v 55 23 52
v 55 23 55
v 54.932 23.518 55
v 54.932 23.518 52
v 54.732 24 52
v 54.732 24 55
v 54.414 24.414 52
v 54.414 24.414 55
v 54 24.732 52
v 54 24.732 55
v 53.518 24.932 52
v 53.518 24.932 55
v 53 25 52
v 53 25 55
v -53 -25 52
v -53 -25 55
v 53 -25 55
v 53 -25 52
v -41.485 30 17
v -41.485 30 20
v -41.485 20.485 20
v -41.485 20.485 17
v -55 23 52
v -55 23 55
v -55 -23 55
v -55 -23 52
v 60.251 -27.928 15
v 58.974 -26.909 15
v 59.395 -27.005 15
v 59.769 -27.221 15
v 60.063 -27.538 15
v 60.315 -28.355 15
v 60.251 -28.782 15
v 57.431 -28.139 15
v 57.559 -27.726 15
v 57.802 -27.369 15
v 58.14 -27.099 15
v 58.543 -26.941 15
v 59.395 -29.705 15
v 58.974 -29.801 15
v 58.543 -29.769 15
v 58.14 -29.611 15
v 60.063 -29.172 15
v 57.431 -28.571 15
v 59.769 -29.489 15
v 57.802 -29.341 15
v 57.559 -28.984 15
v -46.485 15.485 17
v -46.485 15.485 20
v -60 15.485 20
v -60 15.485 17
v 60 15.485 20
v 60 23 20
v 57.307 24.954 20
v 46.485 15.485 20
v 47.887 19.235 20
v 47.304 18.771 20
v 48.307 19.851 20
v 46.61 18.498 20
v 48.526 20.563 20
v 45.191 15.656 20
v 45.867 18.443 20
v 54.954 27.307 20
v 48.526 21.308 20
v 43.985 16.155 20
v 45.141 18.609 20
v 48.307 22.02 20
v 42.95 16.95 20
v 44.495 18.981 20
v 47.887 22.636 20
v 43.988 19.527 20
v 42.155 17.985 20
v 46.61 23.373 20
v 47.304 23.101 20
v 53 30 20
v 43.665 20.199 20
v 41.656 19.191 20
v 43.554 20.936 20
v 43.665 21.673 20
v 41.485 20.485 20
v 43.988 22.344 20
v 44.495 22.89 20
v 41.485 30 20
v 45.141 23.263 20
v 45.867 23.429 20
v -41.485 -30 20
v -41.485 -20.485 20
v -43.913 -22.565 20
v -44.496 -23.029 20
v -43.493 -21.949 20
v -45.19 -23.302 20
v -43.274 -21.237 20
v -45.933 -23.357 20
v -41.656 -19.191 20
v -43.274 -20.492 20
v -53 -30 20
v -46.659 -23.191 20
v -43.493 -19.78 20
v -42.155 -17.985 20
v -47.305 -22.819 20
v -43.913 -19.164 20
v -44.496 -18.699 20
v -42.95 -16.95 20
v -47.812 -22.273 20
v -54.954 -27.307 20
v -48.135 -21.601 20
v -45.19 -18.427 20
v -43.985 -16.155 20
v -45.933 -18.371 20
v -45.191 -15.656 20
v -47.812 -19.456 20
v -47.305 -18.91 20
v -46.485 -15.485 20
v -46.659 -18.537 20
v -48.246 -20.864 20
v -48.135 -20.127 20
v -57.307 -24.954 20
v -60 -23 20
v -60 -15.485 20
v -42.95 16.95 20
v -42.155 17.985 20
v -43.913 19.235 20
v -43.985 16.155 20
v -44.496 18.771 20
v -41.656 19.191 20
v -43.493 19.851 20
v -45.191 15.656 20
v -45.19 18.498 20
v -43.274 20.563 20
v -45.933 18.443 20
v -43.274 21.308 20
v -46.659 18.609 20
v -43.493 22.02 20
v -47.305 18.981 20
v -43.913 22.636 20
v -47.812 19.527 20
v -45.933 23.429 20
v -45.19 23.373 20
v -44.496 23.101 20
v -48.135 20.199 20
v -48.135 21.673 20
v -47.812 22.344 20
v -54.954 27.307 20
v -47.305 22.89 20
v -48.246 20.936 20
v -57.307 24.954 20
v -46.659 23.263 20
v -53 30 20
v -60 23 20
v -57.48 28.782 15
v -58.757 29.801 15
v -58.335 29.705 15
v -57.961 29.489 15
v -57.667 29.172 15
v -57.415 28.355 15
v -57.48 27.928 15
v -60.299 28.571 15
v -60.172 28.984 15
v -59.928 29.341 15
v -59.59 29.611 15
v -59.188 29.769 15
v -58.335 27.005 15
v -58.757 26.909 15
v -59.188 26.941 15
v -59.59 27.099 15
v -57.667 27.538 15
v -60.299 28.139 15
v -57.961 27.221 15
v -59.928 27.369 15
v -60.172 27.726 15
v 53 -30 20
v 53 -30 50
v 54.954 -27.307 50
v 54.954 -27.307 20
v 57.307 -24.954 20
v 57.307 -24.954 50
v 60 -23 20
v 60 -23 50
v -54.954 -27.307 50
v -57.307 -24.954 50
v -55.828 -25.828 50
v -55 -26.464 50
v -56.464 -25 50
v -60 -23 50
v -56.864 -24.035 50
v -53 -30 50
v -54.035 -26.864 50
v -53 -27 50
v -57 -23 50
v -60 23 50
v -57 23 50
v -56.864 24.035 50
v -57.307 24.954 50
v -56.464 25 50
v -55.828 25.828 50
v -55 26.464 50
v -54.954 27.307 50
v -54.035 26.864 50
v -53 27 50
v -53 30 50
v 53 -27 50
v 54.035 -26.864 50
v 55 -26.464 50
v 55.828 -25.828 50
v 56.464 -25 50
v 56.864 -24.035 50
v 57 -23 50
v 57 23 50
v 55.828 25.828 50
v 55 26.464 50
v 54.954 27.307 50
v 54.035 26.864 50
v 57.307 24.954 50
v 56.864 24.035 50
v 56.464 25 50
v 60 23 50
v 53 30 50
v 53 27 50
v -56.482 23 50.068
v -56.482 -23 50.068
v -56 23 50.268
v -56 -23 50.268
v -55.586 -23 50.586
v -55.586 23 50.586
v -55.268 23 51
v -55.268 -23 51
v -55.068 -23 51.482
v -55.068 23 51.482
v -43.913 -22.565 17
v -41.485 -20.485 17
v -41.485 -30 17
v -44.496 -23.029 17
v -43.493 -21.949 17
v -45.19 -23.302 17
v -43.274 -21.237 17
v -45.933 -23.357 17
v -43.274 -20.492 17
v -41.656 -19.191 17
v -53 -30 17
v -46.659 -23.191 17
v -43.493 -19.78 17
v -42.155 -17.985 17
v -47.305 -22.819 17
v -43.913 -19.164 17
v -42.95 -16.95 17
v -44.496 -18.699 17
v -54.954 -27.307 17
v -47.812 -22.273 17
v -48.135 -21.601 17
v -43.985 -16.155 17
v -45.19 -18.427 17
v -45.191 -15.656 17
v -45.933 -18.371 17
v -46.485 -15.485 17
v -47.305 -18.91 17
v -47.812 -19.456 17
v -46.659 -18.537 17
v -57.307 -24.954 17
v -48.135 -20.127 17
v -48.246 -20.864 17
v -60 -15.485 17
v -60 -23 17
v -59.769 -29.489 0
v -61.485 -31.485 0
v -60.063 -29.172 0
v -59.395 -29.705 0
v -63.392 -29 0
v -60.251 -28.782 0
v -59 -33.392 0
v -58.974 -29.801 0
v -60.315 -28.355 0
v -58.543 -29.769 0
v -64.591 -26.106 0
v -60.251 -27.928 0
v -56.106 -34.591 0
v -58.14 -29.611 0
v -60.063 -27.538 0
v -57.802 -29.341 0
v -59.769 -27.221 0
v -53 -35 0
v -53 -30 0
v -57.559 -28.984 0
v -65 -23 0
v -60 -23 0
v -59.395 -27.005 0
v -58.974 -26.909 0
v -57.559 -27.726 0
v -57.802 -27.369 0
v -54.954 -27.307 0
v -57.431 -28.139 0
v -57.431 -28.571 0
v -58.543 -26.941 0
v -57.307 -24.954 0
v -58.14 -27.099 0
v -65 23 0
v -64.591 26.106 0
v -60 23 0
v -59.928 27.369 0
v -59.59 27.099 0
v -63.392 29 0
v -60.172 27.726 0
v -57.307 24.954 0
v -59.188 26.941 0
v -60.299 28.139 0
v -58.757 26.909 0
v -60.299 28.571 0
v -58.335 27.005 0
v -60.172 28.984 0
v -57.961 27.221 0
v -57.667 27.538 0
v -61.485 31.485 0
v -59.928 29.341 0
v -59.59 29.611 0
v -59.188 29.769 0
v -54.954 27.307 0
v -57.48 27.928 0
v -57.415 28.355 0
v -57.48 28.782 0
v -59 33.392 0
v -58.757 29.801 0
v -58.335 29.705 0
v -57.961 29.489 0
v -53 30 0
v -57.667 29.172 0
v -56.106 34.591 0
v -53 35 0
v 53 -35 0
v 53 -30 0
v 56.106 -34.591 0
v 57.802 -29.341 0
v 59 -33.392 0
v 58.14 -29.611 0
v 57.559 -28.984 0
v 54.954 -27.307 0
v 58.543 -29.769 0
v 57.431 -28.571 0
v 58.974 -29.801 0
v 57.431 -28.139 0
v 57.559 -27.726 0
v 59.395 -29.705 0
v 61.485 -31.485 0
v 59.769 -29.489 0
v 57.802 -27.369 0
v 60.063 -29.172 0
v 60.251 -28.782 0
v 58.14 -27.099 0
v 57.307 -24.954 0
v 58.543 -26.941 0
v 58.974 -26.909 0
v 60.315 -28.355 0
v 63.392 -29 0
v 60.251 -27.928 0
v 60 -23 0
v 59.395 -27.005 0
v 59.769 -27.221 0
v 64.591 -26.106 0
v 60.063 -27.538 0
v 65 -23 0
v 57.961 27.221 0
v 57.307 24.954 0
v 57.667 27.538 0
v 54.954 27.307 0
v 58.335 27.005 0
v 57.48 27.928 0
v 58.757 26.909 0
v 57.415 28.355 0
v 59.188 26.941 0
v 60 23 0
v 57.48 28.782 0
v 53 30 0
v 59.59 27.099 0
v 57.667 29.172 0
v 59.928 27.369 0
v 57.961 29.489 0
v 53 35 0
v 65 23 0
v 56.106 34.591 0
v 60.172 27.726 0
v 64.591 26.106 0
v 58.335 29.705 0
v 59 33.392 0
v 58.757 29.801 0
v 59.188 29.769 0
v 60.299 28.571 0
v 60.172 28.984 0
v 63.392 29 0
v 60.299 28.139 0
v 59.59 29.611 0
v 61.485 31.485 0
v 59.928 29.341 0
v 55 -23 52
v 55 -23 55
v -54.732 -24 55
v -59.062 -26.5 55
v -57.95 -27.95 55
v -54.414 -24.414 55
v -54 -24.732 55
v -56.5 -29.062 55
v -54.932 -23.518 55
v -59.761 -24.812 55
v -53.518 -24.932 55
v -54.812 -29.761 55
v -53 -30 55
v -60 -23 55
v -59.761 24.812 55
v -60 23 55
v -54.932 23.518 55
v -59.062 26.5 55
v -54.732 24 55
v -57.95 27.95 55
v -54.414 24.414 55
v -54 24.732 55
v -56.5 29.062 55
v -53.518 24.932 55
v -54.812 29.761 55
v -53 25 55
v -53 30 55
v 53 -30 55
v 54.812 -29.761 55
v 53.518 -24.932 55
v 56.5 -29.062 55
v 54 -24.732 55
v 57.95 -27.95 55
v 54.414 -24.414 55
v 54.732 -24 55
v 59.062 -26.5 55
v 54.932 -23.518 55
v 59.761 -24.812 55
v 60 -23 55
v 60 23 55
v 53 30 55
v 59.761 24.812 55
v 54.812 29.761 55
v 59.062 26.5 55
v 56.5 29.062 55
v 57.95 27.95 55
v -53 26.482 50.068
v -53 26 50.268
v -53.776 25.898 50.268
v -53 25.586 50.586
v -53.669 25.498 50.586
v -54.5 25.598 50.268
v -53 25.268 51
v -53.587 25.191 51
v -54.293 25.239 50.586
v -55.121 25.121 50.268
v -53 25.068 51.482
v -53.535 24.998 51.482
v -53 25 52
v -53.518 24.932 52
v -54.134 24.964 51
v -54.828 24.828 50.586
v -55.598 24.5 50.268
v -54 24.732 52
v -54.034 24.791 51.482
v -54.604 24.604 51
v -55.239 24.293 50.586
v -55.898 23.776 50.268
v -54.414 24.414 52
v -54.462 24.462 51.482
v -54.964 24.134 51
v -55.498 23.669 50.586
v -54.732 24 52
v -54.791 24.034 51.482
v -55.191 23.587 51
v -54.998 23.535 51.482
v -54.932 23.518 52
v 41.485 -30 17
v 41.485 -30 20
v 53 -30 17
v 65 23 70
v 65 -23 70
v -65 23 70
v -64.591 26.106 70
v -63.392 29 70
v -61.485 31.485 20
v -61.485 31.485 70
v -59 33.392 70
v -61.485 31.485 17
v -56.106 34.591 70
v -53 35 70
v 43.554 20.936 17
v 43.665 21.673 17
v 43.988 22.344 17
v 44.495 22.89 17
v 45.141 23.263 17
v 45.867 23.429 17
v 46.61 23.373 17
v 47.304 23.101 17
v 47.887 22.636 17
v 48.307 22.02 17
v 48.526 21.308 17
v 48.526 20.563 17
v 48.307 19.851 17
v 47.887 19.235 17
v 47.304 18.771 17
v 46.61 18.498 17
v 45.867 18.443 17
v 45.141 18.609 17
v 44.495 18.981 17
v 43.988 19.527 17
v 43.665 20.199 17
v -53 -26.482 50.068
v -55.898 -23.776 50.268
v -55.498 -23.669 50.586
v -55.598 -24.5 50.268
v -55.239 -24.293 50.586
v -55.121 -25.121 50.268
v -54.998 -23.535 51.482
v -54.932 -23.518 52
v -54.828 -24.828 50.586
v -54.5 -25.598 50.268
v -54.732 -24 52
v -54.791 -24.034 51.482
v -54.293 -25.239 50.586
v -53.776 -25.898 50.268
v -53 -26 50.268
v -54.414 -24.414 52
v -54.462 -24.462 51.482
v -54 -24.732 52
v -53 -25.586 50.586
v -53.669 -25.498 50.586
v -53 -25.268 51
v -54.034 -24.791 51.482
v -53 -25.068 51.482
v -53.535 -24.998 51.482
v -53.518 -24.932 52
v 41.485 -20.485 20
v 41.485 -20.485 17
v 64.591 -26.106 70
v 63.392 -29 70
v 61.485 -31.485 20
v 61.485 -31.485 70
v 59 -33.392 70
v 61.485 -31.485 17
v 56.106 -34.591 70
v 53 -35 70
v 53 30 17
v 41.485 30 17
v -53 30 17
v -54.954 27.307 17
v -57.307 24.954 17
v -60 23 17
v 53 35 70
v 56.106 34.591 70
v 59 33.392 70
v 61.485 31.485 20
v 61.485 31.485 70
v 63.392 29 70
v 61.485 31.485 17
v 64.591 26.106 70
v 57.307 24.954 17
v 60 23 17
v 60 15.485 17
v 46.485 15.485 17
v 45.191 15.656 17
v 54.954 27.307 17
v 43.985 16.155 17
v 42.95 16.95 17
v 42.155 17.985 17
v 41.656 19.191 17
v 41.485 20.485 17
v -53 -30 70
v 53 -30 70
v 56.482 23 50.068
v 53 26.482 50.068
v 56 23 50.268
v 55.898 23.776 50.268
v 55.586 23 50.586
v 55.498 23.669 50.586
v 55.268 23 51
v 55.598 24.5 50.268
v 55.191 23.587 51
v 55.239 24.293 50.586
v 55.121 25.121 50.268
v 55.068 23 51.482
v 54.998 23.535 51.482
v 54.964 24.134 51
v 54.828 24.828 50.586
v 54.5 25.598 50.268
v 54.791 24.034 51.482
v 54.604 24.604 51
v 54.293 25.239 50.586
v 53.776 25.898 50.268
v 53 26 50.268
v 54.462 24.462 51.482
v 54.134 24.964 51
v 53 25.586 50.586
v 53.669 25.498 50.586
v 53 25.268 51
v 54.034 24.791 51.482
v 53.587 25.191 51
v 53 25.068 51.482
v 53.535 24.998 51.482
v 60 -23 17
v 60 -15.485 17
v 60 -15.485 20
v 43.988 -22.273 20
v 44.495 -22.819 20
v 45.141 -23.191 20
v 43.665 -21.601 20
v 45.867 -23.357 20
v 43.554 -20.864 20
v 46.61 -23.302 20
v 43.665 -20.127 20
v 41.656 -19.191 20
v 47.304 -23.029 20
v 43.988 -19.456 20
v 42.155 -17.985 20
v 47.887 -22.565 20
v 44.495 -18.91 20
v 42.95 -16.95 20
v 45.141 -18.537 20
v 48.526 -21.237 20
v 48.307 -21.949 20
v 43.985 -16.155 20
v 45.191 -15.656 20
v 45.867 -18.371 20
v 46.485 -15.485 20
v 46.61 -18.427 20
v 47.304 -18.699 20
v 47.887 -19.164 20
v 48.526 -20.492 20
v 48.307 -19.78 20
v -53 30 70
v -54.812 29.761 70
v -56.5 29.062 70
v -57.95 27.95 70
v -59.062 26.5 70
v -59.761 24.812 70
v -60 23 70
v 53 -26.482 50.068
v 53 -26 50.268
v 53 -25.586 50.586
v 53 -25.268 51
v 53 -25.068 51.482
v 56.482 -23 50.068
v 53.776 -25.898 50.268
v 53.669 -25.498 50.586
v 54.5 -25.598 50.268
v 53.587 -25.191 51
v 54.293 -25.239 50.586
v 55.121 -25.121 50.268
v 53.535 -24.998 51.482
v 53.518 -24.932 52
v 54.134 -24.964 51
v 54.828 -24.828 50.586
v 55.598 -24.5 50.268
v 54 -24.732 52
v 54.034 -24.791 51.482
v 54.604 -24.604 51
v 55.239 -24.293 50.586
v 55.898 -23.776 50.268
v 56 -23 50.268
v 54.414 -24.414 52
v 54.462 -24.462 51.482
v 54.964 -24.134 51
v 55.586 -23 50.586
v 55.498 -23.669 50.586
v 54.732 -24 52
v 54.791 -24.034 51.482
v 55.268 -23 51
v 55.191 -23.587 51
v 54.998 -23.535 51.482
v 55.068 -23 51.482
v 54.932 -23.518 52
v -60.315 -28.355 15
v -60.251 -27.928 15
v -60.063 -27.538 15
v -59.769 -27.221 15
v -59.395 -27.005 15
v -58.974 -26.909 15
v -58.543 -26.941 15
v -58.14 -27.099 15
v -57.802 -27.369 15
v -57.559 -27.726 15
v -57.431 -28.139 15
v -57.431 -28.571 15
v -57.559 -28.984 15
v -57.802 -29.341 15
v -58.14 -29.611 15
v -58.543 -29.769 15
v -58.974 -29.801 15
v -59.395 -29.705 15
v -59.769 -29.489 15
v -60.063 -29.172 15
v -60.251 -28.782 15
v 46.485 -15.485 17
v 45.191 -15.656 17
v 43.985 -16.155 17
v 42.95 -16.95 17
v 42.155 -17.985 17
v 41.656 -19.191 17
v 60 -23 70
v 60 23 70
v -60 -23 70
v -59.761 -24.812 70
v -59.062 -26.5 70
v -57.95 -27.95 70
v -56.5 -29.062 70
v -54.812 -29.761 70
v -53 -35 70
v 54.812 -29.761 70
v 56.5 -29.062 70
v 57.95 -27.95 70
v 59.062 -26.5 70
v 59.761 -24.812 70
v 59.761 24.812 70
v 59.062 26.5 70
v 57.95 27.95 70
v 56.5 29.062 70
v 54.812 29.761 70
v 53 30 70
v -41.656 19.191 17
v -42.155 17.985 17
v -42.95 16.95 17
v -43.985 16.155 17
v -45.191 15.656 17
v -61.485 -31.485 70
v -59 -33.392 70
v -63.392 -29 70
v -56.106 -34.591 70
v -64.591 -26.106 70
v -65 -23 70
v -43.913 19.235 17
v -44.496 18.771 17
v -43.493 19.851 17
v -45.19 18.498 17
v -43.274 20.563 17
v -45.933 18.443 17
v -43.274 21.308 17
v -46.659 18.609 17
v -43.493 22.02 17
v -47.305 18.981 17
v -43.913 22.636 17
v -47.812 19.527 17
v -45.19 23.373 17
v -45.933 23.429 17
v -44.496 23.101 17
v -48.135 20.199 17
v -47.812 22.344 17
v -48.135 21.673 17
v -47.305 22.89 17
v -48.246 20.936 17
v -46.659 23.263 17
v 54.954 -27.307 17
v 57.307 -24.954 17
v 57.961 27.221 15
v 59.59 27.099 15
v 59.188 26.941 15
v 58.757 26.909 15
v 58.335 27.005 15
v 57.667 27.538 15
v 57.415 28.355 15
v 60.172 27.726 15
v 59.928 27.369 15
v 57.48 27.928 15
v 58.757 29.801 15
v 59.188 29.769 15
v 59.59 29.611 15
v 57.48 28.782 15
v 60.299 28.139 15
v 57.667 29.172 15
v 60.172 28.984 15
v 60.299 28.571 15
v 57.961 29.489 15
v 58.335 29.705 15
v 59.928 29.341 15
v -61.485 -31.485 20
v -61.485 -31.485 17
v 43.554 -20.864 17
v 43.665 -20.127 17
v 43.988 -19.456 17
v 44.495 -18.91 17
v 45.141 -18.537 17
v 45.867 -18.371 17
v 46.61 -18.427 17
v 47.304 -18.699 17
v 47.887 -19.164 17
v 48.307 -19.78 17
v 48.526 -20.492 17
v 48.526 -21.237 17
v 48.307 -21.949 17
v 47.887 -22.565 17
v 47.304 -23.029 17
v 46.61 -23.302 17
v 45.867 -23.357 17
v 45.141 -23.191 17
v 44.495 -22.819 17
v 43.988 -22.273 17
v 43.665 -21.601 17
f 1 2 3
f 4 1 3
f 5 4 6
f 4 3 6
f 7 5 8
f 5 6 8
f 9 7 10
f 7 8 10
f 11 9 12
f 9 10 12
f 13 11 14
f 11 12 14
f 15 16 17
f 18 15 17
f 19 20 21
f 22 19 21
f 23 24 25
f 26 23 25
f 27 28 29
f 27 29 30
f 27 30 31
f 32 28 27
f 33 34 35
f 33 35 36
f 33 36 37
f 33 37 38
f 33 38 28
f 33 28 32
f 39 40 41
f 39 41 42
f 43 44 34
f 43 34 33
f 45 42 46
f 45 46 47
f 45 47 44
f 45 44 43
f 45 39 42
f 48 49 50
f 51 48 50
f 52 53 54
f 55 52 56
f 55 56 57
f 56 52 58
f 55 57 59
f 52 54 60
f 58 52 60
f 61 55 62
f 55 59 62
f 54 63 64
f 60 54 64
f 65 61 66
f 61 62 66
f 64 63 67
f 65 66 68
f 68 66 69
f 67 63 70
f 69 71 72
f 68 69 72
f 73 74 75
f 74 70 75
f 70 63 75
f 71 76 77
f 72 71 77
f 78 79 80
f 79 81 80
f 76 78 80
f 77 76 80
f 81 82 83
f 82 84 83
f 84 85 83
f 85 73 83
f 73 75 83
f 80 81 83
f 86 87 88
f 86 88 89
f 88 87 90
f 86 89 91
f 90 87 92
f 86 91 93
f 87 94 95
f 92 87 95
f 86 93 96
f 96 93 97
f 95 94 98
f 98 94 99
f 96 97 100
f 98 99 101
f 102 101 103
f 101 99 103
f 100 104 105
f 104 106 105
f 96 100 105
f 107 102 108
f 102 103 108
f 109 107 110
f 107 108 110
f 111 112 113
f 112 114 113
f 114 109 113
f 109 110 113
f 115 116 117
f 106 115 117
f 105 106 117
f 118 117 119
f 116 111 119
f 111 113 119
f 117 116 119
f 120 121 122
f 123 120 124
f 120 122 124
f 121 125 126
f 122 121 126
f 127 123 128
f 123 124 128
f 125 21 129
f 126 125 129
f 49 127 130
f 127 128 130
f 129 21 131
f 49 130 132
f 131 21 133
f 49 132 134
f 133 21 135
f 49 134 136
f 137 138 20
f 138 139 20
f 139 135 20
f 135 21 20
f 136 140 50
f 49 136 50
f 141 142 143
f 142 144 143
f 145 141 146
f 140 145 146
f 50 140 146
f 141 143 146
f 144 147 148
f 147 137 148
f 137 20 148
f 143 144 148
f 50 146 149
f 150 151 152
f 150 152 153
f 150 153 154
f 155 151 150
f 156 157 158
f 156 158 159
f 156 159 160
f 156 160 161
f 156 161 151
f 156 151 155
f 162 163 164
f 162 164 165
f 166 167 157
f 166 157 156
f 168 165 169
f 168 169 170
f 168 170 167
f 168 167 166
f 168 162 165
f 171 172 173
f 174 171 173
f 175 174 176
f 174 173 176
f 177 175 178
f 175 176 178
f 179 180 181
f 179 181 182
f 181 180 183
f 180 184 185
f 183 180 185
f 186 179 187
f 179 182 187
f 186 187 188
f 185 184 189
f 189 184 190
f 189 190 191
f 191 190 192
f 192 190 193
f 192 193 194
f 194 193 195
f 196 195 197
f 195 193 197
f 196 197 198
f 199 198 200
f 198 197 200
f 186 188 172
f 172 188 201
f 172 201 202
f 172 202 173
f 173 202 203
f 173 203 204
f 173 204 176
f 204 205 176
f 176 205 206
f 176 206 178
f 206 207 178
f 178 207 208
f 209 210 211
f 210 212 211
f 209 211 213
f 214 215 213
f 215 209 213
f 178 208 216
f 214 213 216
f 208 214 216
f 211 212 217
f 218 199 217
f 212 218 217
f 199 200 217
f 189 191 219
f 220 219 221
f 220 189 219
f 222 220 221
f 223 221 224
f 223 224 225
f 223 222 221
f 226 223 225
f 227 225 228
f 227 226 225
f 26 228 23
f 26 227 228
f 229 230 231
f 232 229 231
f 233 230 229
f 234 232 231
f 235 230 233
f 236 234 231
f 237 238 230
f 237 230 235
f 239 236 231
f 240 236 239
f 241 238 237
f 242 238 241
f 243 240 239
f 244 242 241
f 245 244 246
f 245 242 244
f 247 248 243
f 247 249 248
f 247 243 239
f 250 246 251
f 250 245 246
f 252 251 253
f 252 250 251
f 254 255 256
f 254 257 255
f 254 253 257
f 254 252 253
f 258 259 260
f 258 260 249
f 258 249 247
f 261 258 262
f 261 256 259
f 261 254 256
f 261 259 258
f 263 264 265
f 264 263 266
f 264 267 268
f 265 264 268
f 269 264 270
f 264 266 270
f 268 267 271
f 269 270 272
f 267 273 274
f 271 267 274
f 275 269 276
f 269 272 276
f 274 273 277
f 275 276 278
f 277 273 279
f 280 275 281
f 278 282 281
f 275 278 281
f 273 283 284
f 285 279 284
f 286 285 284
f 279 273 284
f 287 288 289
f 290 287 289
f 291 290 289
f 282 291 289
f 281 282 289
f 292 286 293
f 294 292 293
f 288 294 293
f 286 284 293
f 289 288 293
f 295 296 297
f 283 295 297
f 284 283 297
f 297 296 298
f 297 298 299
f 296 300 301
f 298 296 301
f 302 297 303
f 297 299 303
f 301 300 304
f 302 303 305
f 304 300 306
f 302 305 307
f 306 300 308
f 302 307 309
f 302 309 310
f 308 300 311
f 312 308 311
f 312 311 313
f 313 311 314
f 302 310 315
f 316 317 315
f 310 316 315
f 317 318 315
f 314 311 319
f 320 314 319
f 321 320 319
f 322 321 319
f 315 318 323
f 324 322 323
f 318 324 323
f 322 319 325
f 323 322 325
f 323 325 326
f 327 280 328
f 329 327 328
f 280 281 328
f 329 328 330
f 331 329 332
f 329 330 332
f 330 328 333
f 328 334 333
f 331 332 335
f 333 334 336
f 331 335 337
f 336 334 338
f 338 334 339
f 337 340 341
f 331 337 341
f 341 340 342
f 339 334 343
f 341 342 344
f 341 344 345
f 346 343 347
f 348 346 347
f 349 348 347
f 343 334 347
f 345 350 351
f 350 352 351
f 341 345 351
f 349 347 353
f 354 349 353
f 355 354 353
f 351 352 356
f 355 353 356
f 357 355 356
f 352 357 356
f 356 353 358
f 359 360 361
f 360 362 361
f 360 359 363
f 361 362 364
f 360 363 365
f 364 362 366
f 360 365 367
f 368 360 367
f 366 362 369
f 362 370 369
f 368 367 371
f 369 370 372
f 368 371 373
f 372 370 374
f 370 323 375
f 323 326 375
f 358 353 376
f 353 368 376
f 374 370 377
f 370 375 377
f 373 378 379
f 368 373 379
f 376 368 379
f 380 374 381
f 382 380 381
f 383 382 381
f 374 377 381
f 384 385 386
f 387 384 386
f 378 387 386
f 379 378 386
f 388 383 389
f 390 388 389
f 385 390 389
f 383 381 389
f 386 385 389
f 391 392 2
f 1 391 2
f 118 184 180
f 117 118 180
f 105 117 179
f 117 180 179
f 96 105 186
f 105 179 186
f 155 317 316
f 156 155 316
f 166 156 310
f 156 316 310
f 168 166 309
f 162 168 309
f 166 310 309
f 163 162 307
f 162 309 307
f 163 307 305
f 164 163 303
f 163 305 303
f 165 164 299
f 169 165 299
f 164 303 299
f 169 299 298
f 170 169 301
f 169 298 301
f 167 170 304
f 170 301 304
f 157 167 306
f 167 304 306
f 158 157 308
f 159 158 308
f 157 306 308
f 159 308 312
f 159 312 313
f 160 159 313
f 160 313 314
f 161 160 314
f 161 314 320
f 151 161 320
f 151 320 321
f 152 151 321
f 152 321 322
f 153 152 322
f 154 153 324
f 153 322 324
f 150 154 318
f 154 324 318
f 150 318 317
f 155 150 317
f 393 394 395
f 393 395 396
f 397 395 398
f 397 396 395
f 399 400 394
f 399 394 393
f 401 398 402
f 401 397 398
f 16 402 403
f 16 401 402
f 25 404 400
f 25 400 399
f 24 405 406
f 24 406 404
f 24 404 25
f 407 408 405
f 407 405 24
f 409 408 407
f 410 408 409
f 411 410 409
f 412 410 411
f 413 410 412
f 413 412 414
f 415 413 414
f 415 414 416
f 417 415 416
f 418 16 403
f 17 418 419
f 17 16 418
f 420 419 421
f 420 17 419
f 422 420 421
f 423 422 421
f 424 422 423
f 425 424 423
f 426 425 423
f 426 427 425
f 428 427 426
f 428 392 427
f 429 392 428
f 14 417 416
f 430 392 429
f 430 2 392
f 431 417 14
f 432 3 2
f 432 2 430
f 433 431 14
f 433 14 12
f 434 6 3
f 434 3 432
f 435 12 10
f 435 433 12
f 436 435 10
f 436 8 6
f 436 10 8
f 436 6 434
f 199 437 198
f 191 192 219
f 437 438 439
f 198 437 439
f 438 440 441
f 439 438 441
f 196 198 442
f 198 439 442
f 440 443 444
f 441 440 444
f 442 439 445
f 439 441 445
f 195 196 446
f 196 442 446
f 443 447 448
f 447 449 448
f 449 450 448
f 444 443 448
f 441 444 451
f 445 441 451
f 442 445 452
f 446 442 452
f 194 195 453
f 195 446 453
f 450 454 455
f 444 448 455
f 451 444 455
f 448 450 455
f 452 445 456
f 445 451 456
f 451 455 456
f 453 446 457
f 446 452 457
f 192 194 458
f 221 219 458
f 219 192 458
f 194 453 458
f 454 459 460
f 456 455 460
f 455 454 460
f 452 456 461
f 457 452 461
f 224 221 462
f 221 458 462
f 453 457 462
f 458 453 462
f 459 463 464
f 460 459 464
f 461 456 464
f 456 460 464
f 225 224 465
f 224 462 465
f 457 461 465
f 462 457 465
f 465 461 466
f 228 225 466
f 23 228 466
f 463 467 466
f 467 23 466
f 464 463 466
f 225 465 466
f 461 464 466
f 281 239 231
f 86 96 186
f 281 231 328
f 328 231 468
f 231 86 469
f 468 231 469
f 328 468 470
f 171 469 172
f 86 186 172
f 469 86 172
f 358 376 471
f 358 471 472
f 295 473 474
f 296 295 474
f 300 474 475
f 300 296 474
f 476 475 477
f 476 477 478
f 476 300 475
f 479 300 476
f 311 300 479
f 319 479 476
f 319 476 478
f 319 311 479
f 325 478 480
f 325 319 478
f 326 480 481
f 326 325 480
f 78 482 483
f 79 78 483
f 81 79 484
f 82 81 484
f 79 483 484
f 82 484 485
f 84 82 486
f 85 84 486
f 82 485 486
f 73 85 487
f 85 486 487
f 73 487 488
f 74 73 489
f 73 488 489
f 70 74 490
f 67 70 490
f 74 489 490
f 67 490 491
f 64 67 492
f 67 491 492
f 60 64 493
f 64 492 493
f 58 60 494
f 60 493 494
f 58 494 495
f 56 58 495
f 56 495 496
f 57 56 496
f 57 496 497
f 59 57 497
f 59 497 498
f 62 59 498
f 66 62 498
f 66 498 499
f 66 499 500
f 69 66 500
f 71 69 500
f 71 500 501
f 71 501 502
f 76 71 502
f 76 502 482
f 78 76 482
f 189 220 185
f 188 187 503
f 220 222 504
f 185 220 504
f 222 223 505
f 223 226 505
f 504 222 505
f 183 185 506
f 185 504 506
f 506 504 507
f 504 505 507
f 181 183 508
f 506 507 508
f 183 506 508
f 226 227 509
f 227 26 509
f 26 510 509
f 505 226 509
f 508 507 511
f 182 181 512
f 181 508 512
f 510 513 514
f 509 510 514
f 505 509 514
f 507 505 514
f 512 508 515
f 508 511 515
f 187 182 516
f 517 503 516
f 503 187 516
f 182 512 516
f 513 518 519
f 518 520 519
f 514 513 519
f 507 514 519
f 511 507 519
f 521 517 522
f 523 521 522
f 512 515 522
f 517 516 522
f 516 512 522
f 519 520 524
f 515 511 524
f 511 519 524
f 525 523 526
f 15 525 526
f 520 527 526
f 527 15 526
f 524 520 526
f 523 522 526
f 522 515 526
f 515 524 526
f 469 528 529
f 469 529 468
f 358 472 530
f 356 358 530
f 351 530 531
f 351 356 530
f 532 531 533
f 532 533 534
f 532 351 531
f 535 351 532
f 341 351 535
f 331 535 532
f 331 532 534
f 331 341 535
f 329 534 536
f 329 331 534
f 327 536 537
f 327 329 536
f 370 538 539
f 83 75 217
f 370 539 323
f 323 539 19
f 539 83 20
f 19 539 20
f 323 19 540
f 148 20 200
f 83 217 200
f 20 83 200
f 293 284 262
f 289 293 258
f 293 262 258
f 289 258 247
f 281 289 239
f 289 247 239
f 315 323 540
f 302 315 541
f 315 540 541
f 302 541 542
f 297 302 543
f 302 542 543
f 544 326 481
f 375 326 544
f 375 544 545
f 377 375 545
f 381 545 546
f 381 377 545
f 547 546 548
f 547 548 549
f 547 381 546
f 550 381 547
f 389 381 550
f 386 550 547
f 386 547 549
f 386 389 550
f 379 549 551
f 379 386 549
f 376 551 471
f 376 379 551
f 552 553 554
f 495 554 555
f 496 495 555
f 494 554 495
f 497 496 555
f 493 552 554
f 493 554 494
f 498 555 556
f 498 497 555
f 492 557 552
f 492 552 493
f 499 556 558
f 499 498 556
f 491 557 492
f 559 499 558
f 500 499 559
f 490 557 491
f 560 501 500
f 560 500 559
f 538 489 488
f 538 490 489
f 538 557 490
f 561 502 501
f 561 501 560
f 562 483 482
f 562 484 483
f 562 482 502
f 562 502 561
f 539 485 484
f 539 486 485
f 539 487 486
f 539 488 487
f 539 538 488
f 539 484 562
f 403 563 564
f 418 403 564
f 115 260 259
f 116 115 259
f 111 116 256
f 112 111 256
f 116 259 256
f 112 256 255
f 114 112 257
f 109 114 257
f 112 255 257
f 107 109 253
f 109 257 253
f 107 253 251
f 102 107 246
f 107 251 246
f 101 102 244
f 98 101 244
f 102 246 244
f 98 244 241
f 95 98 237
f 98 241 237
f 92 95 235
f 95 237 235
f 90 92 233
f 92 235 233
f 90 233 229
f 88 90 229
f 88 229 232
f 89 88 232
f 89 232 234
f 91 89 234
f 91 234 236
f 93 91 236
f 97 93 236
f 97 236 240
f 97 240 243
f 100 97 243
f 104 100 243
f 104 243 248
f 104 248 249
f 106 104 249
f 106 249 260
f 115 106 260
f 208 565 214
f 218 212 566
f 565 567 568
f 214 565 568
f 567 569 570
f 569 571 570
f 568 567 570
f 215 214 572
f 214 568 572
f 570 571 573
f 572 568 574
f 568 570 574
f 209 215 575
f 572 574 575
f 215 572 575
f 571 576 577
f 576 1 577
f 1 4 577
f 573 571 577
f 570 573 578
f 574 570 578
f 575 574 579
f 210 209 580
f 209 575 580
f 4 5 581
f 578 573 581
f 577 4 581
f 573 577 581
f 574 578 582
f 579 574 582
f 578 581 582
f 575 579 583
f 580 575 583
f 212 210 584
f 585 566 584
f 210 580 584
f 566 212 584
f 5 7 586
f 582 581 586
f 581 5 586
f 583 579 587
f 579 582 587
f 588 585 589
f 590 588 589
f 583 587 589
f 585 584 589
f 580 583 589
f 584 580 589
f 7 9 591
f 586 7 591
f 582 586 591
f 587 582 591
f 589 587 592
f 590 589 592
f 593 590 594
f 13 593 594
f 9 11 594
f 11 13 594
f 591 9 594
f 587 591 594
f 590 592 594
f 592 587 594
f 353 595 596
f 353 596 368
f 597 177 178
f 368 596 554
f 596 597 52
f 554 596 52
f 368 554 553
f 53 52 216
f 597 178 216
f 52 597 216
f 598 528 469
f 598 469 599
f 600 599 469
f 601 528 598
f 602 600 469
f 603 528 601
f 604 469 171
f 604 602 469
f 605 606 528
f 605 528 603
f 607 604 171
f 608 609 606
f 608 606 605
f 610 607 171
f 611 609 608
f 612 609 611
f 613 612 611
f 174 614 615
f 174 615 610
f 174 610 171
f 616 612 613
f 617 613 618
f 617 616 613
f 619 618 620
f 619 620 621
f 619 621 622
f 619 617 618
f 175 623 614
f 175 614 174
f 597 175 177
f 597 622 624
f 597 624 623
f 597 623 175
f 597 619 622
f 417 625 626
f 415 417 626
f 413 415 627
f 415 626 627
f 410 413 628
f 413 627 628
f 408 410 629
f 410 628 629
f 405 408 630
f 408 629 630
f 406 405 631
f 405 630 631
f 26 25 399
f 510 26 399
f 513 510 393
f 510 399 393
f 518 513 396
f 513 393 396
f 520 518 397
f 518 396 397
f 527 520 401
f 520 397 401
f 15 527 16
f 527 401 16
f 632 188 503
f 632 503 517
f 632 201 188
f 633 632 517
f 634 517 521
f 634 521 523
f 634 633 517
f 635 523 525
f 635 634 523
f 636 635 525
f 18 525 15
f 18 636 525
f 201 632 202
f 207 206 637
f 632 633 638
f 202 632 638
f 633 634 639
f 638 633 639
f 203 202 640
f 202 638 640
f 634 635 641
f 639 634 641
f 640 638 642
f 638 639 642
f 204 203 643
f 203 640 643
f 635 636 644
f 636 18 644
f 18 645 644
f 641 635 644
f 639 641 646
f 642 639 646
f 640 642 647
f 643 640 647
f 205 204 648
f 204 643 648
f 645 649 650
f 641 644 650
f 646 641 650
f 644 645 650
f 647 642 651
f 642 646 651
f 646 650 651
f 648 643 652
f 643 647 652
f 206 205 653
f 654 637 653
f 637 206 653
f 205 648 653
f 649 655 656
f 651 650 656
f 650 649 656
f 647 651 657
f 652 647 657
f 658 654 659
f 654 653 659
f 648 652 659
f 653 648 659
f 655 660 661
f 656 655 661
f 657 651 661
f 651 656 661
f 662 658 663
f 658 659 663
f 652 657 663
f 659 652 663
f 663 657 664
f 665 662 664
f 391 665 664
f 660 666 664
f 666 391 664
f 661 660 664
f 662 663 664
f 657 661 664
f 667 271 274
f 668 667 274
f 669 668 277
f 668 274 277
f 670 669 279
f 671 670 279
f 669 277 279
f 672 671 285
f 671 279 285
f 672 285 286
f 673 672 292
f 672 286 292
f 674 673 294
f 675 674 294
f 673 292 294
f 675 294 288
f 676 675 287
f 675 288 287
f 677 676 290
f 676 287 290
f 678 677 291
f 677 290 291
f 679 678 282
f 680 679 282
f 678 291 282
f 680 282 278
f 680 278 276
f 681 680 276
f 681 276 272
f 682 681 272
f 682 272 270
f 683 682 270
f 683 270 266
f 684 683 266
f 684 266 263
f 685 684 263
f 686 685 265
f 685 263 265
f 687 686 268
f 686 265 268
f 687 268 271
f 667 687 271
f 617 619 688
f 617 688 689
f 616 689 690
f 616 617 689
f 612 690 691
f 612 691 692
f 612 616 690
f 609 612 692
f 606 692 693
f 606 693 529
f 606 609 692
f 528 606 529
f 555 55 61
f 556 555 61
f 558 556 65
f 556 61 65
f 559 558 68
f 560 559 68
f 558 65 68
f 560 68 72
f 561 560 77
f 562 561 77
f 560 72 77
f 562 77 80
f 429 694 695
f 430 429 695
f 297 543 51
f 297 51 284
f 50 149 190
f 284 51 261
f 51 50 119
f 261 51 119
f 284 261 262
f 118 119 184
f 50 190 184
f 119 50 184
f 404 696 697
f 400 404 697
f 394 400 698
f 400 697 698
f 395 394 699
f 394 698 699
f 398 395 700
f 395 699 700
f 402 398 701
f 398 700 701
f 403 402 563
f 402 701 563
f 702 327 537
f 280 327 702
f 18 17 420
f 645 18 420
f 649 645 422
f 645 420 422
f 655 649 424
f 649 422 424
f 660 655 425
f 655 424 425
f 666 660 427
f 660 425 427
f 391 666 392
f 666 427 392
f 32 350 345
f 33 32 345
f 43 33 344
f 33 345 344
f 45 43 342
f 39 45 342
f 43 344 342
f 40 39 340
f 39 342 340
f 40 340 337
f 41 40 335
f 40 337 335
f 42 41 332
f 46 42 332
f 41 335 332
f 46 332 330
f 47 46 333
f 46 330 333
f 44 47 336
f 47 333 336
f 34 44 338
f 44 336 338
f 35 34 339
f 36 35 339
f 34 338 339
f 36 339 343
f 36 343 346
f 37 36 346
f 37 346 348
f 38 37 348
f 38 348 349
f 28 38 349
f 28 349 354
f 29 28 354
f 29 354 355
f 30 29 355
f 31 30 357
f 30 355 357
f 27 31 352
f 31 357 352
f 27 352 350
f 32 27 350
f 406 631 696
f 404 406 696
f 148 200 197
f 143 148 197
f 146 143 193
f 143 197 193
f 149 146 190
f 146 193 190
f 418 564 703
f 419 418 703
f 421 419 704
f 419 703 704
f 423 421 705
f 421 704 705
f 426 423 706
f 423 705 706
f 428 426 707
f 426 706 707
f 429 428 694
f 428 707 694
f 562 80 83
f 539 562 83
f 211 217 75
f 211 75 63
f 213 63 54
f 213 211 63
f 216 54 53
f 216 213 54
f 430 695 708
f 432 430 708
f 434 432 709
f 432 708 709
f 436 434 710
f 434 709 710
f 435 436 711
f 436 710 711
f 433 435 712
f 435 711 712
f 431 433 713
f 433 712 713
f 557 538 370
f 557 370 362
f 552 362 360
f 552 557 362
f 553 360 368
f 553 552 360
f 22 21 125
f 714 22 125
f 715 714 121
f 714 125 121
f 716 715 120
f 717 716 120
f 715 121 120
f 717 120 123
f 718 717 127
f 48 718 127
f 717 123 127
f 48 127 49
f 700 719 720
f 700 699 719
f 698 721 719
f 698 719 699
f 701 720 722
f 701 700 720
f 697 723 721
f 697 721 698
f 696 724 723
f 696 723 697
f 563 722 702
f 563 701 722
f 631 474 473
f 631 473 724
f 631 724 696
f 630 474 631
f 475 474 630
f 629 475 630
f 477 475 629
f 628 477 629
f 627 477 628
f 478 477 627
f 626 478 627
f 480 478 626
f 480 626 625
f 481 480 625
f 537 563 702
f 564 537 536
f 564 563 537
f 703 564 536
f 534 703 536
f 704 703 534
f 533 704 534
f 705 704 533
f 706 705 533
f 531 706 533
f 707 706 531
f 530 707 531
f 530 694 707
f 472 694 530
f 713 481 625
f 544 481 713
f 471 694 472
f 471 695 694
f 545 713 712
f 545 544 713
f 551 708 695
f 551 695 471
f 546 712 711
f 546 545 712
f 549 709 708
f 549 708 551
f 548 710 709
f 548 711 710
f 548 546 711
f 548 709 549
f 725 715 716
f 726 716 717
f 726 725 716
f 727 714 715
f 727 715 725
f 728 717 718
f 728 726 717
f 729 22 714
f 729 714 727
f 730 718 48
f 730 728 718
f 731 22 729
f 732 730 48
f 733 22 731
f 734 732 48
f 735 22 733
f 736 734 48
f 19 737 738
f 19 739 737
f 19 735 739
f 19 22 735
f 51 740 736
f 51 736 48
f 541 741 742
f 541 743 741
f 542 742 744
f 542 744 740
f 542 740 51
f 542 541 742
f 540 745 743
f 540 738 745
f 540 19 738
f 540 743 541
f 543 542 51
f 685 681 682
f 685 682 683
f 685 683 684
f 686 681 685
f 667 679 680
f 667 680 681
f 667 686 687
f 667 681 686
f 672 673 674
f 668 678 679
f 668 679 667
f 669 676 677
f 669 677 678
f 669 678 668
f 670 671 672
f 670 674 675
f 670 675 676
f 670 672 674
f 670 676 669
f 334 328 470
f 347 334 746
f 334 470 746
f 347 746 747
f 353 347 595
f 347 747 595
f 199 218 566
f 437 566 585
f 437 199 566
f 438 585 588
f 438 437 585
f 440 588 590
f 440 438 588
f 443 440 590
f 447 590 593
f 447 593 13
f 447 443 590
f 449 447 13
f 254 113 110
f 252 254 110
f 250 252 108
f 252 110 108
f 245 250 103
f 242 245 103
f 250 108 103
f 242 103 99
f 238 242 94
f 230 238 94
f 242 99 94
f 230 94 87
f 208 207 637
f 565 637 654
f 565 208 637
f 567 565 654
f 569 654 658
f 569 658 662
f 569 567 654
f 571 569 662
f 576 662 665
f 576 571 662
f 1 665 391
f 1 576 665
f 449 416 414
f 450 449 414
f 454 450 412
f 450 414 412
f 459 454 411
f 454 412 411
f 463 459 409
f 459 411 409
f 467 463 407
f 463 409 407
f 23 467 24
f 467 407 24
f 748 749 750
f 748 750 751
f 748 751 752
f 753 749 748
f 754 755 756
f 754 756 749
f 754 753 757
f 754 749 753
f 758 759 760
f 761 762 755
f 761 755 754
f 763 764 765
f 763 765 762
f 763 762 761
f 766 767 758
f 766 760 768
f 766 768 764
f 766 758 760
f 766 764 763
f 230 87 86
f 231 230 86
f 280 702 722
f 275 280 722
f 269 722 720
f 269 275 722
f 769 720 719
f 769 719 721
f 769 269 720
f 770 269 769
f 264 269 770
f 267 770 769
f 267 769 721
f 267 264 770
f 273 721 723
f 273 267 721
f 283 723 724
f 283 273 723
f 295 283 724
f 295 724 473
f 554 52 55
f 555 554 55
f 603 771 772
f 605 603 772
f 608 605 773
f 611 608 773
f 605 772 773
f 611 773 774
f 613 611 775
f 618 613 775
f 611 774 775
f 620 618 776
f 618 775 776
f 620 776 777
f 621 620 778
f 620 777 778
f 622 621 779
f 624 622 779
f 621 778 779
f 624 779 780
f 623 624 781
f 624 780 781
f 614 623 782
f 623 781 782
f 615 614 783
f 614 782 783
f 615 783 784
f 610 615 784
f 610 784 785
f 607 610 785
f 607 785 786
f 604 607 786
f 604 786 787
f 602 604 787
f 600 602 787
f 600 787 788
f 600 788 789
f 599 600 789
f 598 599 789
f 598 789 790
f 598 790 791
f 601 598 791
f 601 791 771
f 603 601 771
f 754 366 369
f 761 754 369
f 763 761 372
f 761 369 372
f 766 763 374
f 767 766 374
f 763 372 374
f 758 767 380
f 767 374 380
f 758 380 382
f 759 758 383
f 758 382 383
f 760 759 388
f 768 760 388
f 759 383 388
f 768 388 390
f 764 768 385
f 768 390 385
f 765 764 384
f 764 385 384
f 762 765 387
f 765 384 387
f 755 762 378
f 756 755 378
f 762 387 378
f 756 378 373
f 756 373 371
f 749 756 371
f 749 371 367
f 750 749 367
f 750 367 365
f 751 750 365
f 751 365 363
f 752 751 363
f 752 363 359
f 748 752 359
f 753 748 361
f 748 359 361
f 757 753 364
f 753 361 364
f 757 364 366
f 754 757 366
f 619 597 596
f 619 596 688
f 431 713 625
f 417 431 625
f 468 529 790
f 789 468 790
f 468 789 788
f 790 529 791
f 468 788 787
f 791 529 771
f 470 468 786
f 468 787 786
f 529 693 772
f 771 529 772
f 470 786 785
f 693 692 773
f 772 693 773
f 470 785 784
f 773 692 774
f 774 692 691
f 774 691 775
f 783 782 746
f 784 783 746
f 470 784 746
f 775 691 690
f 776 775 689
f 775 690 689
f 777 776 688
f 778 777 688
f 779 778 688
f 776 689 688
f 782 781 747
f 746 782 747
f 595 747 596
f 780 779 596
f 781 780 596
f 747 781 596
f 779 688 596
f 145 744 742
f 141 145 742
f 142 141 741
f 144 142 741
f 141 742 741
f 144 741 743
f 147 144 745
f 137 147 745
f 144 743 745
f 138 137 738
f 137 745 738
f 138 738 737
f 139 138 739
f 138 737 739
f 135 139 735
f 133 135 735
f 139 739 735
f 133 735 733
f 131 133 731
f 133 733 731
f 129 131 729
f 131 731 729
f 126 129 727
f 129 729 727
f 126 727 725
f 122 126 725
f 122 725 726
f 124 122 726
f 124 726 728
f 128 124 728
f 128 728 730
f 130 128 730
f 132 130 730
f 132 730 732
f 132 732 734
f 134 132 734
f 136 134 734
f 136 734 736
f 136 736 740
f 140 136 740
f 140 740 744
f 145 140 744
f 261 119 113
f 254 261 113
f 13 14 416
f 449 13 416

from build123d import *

# Parameters (mm, degrees)
EXTRUDE_1_DEPTH     = 70
CUT_EXTRUDE_1_DEPTH = 70
EXTRUDE_2_DEPTH     = 20
CUT_EXTRUDE_2_DEPTH = 15
EXTRUDE_3_DEPTH     = 50
SKETCH_5_R          = 1.45
CUT_EXTRUDE_3_DEPTH = 15
FILLET_1_R          = 2
EXTRUDE_4_DEPTH     = 3
SKETCH_7_R          = 2.5
CUT_EXTRUDE_4_DEPTH = 4


with BuildPart() as part:
    # Эскиз1 → Бобышка-Вытянуть1 (new body)
    with BuildSketch(Plane.XY):
        with BuildLine():
            Line((-53, 35), (53, 35))
            ThreePointArc((53, 35), (61.485281374, 31.485281374), (65, 23))
            Line((65, 23), (65, -23))
            ThreePointArc((65, -23), (61.485281374, -31.485281374), (53, -35))
            Line((53, -35), (-53, -35))
            ThreePointArc((-53, -35), (-61.485281374, -31.485281374), (-65, -23))
            Line((-65, -23), (-65, 23))
            ThreePointArc((-65, 23), (-61.485281374, 31.485281374), (-53, 35))
        make_face()
    extrude(amount=EXTRUDE_1_DEPTH)

    # Эскиз2 → Вырез-Вытянуть1 (cut)
    with BuildSketch(Plane.XY.offset(70)):
        with BuildLine():
            Line((-53, -30), (53, -30))
            ThreePointArc((53, -30), (57.949747468, -27.949747468), (60, -23))
            Line((60, -23), (60, 23))
            ThreePointArc((60, 23), (57.949747468, 27.949747468), (53, 30))
            Line((53, 30), (-53, 30))
            ThreePointArc((-53, 30), (-57.949747468, 27.949747468), (-60, 23))
            Line((-60, 23), (-60, -23))
            ThreePointArc((-60, -23), (-57.949747468, -27.949747468), (-53, -30))
        make_face()
    extrude(amount=-CUT_EXTRUDE_1_DEPTH, mode=Mode.SUBTRACT)

    # Эскиз3 → Бобышка-Вытянуть2 (add)
    with BuildSketch(Plane.XY.offset(70)):
        with BuildLine():
            Line((-53, -30), (53, -30))
            ThreePointArc((53, -30), (57.949747468, -27.949747468), (60, -23))
            Line((60, -23), (60, 23))
            ThreePointArc((60, 23), (57.949747468, 27.949747468), (53, 30))
            Line((53, 30), (-53, 30))
            ThreePointArc((-53, 30), (-57.949747468, 27.949747468), (-60, 23))
            Line((-60, 23), (-60, -23))
            ThreePointArc((-60, -23), (-57.949747468, -27.949747468), (-53, -30))
        make_face()
        with BuildLine():
            Line((-53, -25), (53, -25))
            ThreePointArc((53, -25), (54.414213562, -24.414213562), (55, -23))
            Line((55, -23), (55, 23))
            ThreePointArc((55, 23), (54.414213562, 24.414213562), (53, 25))
            Line((53, 25), (-53, 25))
            ThreePointArc((-53, 25), (-54.414213562, 24.414213562), (-55, 23))
            Line((-55, 23), (-55, -23))
            ThreePointArc((-55, -23), (-54.414213562, -24.414213562), (-53, -25))
        make_face(mode=Mode.SUBTRACT)
    extrude(amount=-EXTRUDE_2_DEPTH)

    # Эскиз3<2> → Вырез-Вытянуть2 (cut)
    with BuildSketch(Plane.XY.offset(70)):
        with BuildLine():
            Line((-53, -30), (53, -30))
            ThreePointArc((53, -30), (57.949747468, -27.949747468), (60, -23))
            Line((60, -23), (60, 23))
            ThreePointArc((60, 23), (57.949747468, 27.949747468), (53, 30))
            Line((53, 30), (-53, 30))
            ThreePointArc((-53, 30), (-57.949747468, 27.949747468), (-60, 23))
            Line((-60, 23), (-60, -23))
            ThreePointArc((-60, -23), (-57.949747468, -27.949747468), (-53, -30))
        make_face()
        with BuildLine():
            Line((-53, -25), (53, -25))
            ThreePointArc((53, -25), (54.414213562, -24.414213562), (55, -23))
            Line((55, -23), (55, 23))
            ThreePointArc((55, 23), (54.414213562, 24.414213562), (53, 25))
            Line((53, 25), (-53, 25))
            ThreePointArc((-53, 25), (-54.414213562, 24.414213562), (-55, 23))
            Line((-55, 23), (-55, -23))
            ThreePointArc((-55, -23), (-54.414213562, -24.414213562), (-53, -25))
        make_face(mode=Mode.SUBTRACT)
    extrude(amount=-CUT_EXTRUDE_2_DEPTH, mode=Mode.SUBTRACT)

    # Эскиз4 → Бобышка-Вытянуть3 (add)
    with BuildSketch(Plane(origin=(0, 0, 50), x_dir=(-1, 0, 0), z_dir=(0, 0, -1))):
        with BuildLine():
            ThreePointArc((-53, 30), (-56.083662278, 26.083662278), (-60, 23))
            ThreePointArc((-60, 23), (-57.949747468, 27.949747468), (-53, 30))
        make_face()
        with BuildLine():
            ThreePointArc((53, 30), (56.083662278, 26.083662278), (60, 23))
            ThreePointArc((60, 23), (57.949747468, 27.949747468), (53, 30))
        make_face()
        with BuildLine():
            ThreePointArc((53, -30), (57.949747468, -27.949747468), (60, -23))
            ThreePointArc((60, -23), (56.083662278, -26.083662278), (53, -30))
        make_face()
        with BuildLine():
            ThreePointArc((-53, -30), (-56.083662278, -26.083662278), (-60, -23))
            ThreePointArc((-60, -23), (-57.949747468, -27.949747468), (-53, -30))
        make_face()
    extrude(amount=EXTRUDE_3_DEPTH)

    # Эскиз5 → Вырез-Вытянуть3 (cut)
    with BuildSketch(Plane(origin=(0, 0, 0), x_dir=(-1, 0, 0), z_dir=(0, 0, -1))):
        with Locations((-58.865243762, 28.354943792)):
            Circle(SKETCH_5_R)
        with Locations((58.865243762, 28.354943792)):
            Circle(SKETCH_5_R)
        with Locations((58.865243762, -28.354943792)):
            Circle(SKETCH_5_R)
        with Locations((-58.865243762, -28.354943792)):
            Circle(SKETCH_5_R)
    extrude(amount=-CUT_EXTRUDE_3_DEPTH, mode=Mode.SUBTRACT)

    # Скругление1
    fillet_1_edges = [part.edges().sort_by_distance(p)[0] for p in [
        (54.414213562, -24.414213562, 50),
        (0, -25, 50),
        (-54.414213562, -24.414213562, 50),
        (-55, 0, 50),
        (-54.414213562, 24.414213562, 50),
        (0, 25, 50),
        (54.414213562, 24.414213562, 50),
        (55, 0, 50),
    ]]
    fillet(fillet_1_edges, radius=FILLET_1_R)

    # Эскиз6 → Бобышка-Вытянуть4 (add)
    with BuildSketch(Plane(origin=(0, 0, 20), x_dir=(-1, 0, 0), z_dir=(0, 0, -1))):
        with BuildLine():
            Line((61.485281374, 31.485281374), (41.485281374, 31.485281374))
            Line((41.485281374, 31.485281374), (41.485281374, 20.485281374))
            ThreePointArc((41.485281374, 20.485281374), (42.949747468, 16.949747468), (46.485281374, 15.485281374))
            Line((46.485281374, 15.485281374), (61.485281374, 15.485281374))
            Line((61.485281374, 15.485281374), (61.485281374, 31.485281374))
        make_face()
        with BuildLine():
            Line((-61.485281374, 15.485281374), (-46.485281374, 15.485281374))
            ThreePointArc((-46.485281374, 15.485281374), (-42.949747468, 16.949747468), (-41.485281374, 20.485281374))
            Line((-41.485281374, 20.485281374), (-41.485281374, 31.485281374))
            Line((-41.485281374, 31.485281374), (-61.485281374, 31.485281374))
            Line((-61.485281374, 31.485281374), (-61.485281374, 15.485281374))
        make_face()
        with BuildLine():
            Line((-61.485281374, -31.485281374), (-61.485281374, -15.485281374))
            Line((-61.485281374, -15.485281374), (-46.485281374, -15.485281374))
            ThreePointArc((-46.485281374, -15.485281374), (-42.949747468, -16.949747468), (-41.485281374, -20.485281374))
            Line((-41.485281374, -20.485281374), (-41.485281374, -31.485281374))
            Line((-41.485281374, -31.485281374), (-61.485281374, -31.485281374))
        make_face()
        with BuildLine():
            Line((61.485281374, -15.485281374), (46.485281374, -15.485281374))
            ThreePointArc((46.485281374, -15.485281374), (42.949747468, -16.949747468), (41.485281374, -20.485281374))
            Line((41.485281374, -20.485281374), (41.485281374, -31.485281374))
            Line((41.485281374, -31.485281374), (61.485281374, -31.485281374))
            Line((61.485281374, -31.485281374), (61.485281374, -15.485281374))
        make_face()
    extrude(amount=EXTRUDE_4_DEPTH)

    # Эскиз7 → Вырез-Вытянуть4 (cut)
    with BuildSketch(Plane(origin=(0, 0, 17), x_dir=(-1, 0, 0), z_dir=(0, 0, -1))):
        with Locations((-46.054090748, 20.935782702)):
            Circle(SKETCH_7_R)
        with Locations((45.745909252, 20.935782702)):
            Circle(SKETCH_7_R)
        with Locations((45.745909252, -20.864217298)):
            Circle(SKETCH_7_R)
        with Locations((-46.054090748, -20.864217298)):
            Circle(SKETCH_7_R)
    extrude(amount=-CUT_EXTRUDE_4_DEPTH, mode=Mode.SUBTRACT)


solid = part.part
